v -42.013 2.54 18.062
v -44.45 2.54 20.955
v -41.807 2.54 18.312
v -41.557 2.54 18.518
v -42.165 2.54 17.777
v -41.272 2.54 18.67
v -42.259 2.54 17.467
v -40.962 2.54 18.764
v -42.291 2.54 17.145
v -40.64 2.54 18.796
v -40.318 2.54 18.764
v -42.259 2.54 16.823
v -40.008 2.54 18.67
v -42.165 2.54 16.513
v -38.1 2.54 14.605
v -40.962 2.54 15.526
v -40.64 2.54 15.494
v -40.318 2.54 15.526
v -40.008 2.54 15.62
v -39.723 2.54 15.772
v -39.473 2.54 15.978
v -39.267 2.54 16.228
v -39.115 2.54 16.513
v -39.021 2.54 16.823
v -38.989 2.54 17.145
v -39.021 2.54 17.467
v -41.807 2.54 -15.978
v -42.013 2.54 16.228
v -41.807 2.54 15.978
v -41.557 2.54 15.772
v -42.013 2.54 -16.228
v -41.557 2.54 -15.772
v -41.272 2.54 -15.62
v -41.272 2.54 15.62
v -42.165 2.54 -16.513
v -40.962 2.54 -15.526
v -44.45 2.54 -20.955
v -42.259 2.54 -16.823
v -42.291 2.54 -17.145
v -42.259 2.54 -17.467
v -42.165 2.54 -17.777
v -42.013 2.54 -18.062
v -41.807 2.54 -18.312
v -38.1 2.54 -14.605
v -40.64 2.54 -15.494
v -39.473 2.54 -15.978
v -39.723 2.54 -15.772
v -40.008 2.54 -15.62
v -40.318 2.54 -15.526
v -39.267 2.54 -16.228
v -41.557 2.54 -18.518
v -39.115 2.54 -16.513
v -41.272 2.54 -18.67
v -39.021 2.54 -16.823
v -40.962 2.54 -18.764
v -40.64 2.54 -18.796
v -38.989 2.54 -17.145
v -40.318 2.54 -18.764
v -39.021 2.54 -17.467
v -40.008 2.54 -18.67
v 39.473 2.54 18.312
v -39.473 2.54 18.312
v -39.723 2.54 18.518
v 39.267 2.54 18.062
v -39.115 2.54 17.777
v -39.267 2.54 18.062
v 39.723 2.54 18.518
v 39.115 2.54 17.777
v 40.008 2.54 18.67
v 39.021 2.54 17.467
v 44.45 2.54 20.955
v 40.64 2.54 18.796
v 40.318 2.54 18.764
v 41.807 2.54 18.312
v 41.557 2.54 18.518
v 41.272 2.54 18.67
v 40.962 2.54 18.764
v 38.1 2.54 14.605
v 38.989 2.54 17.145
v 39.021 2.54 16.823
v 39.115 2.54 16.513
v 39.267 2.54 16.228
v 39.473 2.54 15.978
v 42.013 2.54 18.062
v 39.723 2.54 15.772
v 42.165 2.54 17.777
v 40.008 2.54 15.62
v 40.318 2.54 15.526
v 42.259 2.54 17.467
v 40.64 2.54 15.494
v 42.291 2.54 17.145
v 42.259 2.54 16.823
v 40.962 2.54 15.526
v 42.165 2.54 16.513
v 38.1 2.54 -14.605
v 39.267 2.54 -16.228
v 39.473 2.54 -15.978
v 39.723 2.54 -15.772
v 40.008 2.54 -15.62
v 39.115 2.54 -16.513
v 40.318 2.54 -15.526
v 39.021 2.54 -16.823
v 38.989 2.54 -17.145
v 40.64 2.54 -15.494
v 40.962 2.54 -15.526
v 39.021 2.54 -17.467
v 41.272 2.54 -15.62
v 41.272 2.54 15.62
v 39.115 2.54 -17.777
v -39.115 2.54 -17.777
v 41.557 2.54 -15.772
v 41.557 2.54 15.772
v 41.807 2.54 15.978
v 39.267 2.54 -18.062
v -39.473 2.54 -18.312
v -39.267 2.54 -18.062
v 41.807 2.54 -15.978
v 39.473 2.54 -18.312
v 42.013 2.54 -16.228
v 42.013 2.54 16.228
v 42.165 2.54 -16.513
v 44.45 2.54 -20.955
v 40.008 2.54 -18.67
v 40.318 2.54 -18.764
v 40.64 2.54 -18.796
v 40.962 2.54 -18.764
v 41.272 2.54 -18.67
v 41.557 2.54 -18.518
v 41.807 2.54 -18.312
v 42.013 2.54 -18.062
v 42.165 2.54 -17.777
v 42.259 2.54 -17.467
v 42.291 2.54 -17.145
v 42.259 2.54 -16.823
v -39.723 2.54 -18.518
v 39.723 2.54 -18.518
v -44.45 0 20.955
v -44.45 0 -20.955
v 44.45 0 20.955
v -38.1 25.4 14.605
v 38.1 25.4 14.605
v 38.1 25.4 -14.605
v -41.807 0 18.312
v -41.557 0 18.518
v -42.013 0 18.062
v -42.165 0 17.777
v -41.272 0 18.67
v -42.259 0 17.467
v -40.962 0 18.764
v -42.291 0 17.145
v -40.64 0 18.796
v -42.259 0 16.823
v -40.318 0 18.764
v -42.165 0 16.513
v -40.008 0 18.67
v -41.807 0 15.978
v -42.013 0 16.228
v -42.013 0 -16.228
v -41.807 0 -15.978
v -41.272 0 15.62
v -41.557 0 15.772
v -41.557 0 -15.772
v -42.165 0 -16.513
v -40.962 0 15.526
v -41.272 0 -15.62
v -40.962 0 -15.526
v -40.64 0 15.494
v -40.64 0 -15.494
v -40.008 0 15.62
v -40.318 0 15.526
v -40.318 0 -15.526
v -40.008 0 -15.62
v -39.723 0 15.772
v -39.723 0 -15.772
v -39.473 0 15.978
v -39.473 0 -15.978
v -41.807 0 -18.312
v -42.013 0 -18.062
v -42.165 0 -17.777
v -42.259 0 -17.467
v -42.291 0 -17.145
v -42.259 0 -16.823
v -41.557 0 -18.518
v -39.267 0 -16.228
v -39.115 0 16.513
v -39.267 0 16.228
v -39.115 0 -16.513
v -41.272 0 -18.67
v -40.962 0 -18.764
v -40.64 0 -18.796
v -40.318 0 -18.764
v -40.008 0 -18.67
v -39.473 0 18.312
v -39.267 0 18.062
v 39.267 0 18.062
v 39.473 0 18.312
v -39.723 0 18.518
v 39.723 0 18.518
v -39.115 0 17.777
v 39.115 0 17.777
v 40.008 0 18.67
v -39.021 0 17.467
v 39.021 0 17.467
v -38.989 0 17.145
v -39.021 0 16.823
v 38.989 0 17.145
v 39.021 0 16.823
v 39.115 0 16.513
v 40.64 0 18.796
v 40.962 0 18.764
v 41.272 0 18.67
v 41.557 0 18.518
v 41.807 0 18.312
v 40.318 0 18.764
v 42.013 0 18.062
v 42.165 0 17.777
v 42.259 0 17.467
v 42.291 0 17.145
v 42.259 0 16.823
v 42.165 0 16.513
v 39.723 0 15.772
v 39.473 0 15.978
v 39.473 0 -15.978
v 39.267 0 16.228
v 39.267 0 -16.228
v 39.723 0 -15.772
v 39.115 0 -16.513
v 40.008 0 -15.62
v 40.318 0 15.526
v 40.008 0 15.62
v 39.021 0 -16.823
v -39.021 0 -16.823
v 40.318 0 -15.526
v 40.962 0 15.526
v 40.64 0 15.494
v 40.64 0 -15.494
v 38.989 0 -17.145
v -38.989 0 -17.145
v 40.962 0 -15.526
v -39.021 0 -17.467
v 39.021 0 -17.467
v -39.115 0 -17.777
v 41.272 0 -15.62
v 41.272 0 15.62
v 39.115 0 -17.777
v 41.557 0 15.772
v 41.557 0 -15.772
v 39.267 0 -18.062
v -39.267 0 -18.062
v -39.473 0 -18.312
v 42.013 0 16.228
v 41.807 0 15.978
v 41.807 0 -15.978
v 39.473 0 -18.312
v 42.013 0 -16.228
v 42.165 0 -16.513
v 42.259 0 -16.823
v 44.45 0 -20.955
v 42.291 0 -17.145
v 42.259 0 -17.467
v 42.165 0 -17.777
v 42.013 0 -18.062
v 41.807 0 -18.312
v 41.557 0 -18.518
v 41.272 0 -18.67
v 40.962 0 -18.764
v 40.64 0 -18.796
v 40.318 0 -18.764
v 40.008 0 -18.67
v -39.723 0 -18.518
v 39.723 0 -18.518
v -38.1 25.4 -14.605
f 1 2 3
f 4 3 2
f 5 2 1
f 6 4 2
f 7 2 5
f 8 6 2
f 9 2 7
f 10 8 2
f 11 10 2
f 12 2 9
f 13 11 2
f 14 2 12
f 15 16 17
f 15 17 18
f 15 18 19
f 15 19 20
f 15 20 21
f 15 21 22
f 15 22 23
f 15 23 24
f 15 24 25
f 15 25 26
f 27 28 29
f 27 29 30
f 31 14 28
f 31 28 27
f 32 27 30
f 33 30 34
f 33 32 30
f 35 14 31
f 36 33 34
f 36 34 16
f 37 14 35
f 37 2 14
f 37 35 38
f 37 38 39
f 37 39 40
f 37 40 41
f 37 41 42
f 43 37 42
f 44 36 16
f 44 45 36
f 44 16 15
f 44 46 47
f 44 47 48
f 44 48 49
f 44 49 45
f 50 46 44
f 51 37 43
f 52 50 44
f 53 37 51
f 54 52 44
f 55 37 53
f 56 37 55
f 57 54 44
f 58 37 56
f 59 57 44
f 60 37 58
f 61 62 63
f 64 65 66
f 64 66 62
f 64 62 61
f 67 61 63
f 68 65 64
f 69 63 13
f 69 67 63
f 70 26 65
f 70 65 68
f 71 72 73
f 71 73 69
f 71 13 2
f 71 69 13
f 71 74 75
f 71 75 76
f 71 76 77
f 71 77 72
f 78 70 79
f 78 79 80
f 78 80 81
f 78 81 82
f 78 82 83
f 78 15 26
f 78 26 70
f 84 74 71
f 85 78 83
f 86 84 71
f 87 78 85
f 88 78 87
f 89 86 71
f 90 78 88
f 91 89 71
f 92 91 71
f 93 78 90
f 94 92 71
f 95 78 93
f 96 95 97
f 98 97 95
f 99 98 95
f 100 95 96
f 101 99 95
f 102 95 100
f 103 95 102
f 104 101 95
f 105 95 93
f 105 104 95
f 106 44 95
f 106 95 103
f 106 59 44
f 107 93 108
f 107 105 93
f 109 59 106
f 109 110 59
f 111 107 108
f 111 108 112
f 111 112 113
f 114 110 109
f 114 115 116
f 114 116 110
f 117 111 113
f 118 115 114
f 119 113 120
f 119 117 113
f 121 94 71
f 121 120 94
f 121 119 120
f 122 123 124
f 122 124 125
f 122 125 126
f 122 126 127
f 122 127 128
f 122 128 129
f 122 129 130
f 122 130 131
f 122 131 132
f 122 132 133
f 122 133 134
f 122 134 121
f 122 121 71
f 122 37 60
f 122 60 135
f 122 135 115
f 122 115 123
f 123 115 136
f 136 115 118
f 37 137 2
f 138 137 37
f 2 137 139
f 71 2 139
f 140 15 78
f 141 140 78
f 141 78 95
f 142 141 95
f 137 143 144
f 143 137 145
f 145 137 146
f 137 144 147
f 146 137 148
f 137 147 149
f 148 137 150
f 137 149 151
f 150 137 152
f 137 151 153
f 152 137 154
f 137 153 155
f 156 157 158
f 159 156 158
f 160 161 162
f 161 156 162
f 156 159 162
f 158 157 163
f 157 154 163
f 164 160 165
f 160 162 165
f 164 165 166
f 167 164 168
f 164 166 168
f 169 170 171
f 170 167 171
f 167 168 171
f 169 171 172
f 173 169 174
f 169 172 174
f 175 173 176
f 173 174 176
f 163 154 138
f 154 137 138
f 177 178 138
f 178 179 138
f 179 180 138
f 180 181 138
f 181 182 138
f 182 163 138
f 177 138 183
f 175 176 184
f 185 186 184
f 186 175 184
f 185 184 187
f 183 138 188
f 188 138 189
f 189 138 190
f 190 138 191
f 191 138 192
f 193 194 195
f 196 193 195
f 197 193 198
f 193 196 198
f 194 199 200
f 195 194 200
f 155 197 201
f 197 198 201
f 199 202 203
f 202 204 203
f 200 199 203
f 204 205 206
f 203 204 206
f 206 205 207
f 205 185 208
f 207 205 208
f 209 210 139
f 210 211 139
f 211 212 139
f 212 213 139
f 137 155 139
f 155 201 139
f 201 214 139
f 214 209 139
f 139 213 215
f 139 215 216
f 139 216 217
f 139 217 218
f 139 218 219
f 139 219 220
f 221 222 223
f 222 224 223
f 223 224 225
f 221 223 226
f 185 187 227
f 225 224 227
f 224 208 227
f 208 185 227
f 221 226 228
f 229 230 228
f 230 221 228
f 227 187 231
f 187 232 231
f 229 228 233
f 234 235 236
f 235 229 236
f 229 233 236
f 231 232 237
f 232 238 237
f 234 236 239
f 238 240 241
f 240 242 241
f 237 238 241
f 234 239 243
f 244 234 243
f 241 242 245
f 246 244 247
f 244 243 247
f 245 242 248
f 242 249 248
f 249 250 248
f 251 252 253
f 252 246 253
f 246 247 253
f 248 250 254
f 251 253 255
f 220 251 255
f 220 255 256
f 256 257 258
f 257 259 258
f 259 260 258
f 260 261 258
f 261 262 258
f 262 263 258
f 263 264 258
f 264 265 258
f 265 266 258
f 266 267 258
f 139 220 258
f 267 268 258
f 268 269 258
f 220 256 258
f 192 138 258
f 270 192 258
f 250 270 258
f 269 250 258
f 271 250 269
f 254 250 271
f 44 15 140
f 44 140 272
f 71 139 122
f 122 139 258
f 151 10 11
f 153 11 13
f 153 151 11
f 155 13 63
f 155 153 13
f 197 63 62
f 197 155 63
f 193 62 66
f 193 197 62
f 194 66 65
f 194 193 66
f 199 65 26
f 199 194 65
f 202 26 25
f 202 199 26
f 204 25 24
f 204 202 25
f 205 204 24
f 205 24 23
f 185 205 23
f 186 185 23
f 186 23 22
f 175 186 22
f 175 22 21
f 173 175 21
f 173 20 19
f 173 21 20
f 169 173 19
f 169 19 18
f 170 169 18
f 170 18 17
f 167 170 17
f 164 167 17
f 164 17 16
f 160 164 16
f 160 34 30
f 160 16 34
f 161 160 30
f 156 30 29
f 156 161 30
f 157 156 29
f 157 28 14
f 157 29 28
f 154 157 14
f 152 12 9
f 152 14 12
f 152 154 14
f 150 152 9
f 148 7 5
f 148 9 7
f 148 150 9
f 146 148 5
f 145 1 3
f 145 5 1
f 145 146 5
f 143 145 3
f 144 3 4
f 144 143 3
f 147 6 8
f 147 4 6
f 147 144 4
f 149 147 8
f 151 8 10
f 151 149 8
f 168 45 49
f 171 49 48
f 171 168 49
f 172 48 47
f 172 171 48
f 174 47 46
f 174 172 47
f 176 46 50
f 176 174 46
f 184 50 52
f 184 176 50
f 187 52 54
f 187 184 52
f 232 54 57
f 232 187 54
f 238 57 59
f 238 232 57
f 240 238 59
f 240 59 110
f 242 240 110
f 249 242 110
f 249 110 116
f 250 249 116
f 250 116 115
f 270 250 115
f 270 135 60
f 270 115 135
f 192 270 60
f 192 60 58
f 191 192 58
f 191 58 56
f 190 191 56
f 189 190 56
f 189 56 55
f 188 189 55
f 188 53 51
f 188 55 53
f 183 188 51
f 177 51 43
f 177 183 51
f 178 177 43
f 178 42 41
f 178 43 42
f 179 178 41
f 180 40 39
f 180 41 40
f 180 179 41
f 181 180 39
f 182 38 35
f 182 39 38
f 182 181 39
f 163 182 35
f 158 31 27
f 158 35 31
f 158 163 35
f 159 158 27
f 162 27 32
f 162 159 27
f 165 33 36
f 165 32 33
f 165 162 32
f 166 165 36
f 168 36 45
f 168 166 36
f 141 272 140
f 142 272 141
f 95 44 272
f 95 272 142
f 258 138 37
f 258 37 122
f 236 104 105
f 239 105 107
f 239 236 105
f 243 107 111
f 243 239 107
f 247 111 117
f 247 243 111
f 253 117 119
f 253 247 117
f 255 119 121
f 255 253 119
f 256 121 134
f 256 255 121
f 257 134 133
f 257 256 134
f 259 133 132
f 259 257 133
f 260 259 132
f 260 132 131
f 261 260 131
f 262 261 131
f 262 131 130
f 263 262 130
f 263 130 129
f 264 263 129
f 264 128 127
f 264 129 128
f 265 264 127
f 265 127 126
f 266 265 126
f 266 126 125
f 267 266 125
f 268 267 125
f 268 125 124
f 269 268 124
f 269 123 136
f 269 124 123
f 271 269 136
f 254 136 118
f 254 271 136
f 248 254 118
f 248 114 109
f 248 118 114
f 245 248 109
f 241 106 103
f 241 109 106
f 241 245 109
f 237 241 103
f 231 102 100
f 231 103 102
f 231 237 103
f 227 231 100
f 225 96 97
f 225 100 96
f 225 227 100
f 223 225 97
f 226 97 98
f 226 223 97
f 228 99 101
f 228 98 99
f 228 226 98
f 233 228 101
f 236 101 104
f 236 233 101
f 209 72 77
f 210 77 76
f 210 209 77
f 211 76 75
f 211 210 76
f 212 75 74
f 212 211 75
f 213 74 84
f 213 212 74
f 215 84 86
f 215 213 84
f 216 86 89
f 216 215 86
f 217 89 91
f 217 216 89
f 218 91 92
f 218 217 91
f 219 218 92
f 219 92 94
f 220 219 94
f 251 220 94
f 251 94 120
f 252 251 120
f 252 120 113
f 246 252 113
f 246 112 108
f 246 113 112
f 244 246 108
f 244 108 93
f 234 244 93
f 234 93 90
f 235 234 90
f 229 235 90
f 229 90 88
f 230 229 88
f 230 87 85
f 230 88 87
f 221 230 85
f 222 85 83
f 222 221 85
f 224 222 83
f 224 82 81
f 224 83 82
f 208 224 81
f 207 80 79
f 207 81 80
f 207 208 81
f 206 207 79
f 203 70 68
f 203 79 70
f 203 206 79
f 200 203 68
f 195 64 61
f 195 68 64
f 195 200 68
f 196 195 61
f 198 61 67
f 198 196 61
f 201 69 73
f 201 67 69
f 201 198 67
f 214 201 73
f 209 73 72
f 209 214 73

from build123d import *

# Parameters (mm, degrees)
SKETCH2_W           = 88.9
SKETCH2_H           = 41.91
BOSS_EXTRUDE1_DEPTH = 2.54
SKETCH3_R           = 1.651
CUT_EXTRUDE2_DEPTH  = 50.207378766
SKETCH4_W           = 76.2
SKETCH4_H           = 29.21
BOSS_EXTRUDE2_DEPTH = 22.86


with BuildPart() as part:
    # Sketch2 → Boss-Extrude1 (new body)
    with BuildSketch(Plane(origin=(0, 0, 0), x_dir=(1, 0, 0), z_dir=(0, 1, 0))):
        Rectangle(SKETCH2_W, SKETCH2_H)
    extrude(amount=BOSS_EXTRUDE1_DEPTH)

    # Sketch3 → Cut-Extrude2 (cut, through all)
    with BuildSketch(Plane(origin=(0, 0, 0), x_dir=(1, 0, 0), z_dir=(0, 1, 0))):
        with Locations(Location((-40.64, 17.145, 0), (0, 0, 270))):
            Circle(SKETCH3_R)
        with Locations(Location((40.64, 17.145, 0), (0, 0, 270))):
            Circle(SKETCH3_R)
        with Locations(Location((40.64, -17.145, 0), (0, 0, 270))):
            Circle(SKETCH3_R)
        with Locations(Location((-40.64, -17.145, 0), (0, 0, 270))):
            Circle(SKETCH3_R)
    extrude(amount=CUT_EXTRUDE2_DEPTH, mode=Mode.SUBTRACT)

    # Sketch4 → Boss-Extrude2 (add)
    with BuildSketch(Plane(origin=(0, 2.54, 0), x_dir=(1, 0, 0), z_dir=(0, 1, 0))):
        Rectangle(SKETCH4_W, SKETCH4_H)
    extrude(amount=BOSS_EXTRUDE2_DEPTH)


solid = part.part
